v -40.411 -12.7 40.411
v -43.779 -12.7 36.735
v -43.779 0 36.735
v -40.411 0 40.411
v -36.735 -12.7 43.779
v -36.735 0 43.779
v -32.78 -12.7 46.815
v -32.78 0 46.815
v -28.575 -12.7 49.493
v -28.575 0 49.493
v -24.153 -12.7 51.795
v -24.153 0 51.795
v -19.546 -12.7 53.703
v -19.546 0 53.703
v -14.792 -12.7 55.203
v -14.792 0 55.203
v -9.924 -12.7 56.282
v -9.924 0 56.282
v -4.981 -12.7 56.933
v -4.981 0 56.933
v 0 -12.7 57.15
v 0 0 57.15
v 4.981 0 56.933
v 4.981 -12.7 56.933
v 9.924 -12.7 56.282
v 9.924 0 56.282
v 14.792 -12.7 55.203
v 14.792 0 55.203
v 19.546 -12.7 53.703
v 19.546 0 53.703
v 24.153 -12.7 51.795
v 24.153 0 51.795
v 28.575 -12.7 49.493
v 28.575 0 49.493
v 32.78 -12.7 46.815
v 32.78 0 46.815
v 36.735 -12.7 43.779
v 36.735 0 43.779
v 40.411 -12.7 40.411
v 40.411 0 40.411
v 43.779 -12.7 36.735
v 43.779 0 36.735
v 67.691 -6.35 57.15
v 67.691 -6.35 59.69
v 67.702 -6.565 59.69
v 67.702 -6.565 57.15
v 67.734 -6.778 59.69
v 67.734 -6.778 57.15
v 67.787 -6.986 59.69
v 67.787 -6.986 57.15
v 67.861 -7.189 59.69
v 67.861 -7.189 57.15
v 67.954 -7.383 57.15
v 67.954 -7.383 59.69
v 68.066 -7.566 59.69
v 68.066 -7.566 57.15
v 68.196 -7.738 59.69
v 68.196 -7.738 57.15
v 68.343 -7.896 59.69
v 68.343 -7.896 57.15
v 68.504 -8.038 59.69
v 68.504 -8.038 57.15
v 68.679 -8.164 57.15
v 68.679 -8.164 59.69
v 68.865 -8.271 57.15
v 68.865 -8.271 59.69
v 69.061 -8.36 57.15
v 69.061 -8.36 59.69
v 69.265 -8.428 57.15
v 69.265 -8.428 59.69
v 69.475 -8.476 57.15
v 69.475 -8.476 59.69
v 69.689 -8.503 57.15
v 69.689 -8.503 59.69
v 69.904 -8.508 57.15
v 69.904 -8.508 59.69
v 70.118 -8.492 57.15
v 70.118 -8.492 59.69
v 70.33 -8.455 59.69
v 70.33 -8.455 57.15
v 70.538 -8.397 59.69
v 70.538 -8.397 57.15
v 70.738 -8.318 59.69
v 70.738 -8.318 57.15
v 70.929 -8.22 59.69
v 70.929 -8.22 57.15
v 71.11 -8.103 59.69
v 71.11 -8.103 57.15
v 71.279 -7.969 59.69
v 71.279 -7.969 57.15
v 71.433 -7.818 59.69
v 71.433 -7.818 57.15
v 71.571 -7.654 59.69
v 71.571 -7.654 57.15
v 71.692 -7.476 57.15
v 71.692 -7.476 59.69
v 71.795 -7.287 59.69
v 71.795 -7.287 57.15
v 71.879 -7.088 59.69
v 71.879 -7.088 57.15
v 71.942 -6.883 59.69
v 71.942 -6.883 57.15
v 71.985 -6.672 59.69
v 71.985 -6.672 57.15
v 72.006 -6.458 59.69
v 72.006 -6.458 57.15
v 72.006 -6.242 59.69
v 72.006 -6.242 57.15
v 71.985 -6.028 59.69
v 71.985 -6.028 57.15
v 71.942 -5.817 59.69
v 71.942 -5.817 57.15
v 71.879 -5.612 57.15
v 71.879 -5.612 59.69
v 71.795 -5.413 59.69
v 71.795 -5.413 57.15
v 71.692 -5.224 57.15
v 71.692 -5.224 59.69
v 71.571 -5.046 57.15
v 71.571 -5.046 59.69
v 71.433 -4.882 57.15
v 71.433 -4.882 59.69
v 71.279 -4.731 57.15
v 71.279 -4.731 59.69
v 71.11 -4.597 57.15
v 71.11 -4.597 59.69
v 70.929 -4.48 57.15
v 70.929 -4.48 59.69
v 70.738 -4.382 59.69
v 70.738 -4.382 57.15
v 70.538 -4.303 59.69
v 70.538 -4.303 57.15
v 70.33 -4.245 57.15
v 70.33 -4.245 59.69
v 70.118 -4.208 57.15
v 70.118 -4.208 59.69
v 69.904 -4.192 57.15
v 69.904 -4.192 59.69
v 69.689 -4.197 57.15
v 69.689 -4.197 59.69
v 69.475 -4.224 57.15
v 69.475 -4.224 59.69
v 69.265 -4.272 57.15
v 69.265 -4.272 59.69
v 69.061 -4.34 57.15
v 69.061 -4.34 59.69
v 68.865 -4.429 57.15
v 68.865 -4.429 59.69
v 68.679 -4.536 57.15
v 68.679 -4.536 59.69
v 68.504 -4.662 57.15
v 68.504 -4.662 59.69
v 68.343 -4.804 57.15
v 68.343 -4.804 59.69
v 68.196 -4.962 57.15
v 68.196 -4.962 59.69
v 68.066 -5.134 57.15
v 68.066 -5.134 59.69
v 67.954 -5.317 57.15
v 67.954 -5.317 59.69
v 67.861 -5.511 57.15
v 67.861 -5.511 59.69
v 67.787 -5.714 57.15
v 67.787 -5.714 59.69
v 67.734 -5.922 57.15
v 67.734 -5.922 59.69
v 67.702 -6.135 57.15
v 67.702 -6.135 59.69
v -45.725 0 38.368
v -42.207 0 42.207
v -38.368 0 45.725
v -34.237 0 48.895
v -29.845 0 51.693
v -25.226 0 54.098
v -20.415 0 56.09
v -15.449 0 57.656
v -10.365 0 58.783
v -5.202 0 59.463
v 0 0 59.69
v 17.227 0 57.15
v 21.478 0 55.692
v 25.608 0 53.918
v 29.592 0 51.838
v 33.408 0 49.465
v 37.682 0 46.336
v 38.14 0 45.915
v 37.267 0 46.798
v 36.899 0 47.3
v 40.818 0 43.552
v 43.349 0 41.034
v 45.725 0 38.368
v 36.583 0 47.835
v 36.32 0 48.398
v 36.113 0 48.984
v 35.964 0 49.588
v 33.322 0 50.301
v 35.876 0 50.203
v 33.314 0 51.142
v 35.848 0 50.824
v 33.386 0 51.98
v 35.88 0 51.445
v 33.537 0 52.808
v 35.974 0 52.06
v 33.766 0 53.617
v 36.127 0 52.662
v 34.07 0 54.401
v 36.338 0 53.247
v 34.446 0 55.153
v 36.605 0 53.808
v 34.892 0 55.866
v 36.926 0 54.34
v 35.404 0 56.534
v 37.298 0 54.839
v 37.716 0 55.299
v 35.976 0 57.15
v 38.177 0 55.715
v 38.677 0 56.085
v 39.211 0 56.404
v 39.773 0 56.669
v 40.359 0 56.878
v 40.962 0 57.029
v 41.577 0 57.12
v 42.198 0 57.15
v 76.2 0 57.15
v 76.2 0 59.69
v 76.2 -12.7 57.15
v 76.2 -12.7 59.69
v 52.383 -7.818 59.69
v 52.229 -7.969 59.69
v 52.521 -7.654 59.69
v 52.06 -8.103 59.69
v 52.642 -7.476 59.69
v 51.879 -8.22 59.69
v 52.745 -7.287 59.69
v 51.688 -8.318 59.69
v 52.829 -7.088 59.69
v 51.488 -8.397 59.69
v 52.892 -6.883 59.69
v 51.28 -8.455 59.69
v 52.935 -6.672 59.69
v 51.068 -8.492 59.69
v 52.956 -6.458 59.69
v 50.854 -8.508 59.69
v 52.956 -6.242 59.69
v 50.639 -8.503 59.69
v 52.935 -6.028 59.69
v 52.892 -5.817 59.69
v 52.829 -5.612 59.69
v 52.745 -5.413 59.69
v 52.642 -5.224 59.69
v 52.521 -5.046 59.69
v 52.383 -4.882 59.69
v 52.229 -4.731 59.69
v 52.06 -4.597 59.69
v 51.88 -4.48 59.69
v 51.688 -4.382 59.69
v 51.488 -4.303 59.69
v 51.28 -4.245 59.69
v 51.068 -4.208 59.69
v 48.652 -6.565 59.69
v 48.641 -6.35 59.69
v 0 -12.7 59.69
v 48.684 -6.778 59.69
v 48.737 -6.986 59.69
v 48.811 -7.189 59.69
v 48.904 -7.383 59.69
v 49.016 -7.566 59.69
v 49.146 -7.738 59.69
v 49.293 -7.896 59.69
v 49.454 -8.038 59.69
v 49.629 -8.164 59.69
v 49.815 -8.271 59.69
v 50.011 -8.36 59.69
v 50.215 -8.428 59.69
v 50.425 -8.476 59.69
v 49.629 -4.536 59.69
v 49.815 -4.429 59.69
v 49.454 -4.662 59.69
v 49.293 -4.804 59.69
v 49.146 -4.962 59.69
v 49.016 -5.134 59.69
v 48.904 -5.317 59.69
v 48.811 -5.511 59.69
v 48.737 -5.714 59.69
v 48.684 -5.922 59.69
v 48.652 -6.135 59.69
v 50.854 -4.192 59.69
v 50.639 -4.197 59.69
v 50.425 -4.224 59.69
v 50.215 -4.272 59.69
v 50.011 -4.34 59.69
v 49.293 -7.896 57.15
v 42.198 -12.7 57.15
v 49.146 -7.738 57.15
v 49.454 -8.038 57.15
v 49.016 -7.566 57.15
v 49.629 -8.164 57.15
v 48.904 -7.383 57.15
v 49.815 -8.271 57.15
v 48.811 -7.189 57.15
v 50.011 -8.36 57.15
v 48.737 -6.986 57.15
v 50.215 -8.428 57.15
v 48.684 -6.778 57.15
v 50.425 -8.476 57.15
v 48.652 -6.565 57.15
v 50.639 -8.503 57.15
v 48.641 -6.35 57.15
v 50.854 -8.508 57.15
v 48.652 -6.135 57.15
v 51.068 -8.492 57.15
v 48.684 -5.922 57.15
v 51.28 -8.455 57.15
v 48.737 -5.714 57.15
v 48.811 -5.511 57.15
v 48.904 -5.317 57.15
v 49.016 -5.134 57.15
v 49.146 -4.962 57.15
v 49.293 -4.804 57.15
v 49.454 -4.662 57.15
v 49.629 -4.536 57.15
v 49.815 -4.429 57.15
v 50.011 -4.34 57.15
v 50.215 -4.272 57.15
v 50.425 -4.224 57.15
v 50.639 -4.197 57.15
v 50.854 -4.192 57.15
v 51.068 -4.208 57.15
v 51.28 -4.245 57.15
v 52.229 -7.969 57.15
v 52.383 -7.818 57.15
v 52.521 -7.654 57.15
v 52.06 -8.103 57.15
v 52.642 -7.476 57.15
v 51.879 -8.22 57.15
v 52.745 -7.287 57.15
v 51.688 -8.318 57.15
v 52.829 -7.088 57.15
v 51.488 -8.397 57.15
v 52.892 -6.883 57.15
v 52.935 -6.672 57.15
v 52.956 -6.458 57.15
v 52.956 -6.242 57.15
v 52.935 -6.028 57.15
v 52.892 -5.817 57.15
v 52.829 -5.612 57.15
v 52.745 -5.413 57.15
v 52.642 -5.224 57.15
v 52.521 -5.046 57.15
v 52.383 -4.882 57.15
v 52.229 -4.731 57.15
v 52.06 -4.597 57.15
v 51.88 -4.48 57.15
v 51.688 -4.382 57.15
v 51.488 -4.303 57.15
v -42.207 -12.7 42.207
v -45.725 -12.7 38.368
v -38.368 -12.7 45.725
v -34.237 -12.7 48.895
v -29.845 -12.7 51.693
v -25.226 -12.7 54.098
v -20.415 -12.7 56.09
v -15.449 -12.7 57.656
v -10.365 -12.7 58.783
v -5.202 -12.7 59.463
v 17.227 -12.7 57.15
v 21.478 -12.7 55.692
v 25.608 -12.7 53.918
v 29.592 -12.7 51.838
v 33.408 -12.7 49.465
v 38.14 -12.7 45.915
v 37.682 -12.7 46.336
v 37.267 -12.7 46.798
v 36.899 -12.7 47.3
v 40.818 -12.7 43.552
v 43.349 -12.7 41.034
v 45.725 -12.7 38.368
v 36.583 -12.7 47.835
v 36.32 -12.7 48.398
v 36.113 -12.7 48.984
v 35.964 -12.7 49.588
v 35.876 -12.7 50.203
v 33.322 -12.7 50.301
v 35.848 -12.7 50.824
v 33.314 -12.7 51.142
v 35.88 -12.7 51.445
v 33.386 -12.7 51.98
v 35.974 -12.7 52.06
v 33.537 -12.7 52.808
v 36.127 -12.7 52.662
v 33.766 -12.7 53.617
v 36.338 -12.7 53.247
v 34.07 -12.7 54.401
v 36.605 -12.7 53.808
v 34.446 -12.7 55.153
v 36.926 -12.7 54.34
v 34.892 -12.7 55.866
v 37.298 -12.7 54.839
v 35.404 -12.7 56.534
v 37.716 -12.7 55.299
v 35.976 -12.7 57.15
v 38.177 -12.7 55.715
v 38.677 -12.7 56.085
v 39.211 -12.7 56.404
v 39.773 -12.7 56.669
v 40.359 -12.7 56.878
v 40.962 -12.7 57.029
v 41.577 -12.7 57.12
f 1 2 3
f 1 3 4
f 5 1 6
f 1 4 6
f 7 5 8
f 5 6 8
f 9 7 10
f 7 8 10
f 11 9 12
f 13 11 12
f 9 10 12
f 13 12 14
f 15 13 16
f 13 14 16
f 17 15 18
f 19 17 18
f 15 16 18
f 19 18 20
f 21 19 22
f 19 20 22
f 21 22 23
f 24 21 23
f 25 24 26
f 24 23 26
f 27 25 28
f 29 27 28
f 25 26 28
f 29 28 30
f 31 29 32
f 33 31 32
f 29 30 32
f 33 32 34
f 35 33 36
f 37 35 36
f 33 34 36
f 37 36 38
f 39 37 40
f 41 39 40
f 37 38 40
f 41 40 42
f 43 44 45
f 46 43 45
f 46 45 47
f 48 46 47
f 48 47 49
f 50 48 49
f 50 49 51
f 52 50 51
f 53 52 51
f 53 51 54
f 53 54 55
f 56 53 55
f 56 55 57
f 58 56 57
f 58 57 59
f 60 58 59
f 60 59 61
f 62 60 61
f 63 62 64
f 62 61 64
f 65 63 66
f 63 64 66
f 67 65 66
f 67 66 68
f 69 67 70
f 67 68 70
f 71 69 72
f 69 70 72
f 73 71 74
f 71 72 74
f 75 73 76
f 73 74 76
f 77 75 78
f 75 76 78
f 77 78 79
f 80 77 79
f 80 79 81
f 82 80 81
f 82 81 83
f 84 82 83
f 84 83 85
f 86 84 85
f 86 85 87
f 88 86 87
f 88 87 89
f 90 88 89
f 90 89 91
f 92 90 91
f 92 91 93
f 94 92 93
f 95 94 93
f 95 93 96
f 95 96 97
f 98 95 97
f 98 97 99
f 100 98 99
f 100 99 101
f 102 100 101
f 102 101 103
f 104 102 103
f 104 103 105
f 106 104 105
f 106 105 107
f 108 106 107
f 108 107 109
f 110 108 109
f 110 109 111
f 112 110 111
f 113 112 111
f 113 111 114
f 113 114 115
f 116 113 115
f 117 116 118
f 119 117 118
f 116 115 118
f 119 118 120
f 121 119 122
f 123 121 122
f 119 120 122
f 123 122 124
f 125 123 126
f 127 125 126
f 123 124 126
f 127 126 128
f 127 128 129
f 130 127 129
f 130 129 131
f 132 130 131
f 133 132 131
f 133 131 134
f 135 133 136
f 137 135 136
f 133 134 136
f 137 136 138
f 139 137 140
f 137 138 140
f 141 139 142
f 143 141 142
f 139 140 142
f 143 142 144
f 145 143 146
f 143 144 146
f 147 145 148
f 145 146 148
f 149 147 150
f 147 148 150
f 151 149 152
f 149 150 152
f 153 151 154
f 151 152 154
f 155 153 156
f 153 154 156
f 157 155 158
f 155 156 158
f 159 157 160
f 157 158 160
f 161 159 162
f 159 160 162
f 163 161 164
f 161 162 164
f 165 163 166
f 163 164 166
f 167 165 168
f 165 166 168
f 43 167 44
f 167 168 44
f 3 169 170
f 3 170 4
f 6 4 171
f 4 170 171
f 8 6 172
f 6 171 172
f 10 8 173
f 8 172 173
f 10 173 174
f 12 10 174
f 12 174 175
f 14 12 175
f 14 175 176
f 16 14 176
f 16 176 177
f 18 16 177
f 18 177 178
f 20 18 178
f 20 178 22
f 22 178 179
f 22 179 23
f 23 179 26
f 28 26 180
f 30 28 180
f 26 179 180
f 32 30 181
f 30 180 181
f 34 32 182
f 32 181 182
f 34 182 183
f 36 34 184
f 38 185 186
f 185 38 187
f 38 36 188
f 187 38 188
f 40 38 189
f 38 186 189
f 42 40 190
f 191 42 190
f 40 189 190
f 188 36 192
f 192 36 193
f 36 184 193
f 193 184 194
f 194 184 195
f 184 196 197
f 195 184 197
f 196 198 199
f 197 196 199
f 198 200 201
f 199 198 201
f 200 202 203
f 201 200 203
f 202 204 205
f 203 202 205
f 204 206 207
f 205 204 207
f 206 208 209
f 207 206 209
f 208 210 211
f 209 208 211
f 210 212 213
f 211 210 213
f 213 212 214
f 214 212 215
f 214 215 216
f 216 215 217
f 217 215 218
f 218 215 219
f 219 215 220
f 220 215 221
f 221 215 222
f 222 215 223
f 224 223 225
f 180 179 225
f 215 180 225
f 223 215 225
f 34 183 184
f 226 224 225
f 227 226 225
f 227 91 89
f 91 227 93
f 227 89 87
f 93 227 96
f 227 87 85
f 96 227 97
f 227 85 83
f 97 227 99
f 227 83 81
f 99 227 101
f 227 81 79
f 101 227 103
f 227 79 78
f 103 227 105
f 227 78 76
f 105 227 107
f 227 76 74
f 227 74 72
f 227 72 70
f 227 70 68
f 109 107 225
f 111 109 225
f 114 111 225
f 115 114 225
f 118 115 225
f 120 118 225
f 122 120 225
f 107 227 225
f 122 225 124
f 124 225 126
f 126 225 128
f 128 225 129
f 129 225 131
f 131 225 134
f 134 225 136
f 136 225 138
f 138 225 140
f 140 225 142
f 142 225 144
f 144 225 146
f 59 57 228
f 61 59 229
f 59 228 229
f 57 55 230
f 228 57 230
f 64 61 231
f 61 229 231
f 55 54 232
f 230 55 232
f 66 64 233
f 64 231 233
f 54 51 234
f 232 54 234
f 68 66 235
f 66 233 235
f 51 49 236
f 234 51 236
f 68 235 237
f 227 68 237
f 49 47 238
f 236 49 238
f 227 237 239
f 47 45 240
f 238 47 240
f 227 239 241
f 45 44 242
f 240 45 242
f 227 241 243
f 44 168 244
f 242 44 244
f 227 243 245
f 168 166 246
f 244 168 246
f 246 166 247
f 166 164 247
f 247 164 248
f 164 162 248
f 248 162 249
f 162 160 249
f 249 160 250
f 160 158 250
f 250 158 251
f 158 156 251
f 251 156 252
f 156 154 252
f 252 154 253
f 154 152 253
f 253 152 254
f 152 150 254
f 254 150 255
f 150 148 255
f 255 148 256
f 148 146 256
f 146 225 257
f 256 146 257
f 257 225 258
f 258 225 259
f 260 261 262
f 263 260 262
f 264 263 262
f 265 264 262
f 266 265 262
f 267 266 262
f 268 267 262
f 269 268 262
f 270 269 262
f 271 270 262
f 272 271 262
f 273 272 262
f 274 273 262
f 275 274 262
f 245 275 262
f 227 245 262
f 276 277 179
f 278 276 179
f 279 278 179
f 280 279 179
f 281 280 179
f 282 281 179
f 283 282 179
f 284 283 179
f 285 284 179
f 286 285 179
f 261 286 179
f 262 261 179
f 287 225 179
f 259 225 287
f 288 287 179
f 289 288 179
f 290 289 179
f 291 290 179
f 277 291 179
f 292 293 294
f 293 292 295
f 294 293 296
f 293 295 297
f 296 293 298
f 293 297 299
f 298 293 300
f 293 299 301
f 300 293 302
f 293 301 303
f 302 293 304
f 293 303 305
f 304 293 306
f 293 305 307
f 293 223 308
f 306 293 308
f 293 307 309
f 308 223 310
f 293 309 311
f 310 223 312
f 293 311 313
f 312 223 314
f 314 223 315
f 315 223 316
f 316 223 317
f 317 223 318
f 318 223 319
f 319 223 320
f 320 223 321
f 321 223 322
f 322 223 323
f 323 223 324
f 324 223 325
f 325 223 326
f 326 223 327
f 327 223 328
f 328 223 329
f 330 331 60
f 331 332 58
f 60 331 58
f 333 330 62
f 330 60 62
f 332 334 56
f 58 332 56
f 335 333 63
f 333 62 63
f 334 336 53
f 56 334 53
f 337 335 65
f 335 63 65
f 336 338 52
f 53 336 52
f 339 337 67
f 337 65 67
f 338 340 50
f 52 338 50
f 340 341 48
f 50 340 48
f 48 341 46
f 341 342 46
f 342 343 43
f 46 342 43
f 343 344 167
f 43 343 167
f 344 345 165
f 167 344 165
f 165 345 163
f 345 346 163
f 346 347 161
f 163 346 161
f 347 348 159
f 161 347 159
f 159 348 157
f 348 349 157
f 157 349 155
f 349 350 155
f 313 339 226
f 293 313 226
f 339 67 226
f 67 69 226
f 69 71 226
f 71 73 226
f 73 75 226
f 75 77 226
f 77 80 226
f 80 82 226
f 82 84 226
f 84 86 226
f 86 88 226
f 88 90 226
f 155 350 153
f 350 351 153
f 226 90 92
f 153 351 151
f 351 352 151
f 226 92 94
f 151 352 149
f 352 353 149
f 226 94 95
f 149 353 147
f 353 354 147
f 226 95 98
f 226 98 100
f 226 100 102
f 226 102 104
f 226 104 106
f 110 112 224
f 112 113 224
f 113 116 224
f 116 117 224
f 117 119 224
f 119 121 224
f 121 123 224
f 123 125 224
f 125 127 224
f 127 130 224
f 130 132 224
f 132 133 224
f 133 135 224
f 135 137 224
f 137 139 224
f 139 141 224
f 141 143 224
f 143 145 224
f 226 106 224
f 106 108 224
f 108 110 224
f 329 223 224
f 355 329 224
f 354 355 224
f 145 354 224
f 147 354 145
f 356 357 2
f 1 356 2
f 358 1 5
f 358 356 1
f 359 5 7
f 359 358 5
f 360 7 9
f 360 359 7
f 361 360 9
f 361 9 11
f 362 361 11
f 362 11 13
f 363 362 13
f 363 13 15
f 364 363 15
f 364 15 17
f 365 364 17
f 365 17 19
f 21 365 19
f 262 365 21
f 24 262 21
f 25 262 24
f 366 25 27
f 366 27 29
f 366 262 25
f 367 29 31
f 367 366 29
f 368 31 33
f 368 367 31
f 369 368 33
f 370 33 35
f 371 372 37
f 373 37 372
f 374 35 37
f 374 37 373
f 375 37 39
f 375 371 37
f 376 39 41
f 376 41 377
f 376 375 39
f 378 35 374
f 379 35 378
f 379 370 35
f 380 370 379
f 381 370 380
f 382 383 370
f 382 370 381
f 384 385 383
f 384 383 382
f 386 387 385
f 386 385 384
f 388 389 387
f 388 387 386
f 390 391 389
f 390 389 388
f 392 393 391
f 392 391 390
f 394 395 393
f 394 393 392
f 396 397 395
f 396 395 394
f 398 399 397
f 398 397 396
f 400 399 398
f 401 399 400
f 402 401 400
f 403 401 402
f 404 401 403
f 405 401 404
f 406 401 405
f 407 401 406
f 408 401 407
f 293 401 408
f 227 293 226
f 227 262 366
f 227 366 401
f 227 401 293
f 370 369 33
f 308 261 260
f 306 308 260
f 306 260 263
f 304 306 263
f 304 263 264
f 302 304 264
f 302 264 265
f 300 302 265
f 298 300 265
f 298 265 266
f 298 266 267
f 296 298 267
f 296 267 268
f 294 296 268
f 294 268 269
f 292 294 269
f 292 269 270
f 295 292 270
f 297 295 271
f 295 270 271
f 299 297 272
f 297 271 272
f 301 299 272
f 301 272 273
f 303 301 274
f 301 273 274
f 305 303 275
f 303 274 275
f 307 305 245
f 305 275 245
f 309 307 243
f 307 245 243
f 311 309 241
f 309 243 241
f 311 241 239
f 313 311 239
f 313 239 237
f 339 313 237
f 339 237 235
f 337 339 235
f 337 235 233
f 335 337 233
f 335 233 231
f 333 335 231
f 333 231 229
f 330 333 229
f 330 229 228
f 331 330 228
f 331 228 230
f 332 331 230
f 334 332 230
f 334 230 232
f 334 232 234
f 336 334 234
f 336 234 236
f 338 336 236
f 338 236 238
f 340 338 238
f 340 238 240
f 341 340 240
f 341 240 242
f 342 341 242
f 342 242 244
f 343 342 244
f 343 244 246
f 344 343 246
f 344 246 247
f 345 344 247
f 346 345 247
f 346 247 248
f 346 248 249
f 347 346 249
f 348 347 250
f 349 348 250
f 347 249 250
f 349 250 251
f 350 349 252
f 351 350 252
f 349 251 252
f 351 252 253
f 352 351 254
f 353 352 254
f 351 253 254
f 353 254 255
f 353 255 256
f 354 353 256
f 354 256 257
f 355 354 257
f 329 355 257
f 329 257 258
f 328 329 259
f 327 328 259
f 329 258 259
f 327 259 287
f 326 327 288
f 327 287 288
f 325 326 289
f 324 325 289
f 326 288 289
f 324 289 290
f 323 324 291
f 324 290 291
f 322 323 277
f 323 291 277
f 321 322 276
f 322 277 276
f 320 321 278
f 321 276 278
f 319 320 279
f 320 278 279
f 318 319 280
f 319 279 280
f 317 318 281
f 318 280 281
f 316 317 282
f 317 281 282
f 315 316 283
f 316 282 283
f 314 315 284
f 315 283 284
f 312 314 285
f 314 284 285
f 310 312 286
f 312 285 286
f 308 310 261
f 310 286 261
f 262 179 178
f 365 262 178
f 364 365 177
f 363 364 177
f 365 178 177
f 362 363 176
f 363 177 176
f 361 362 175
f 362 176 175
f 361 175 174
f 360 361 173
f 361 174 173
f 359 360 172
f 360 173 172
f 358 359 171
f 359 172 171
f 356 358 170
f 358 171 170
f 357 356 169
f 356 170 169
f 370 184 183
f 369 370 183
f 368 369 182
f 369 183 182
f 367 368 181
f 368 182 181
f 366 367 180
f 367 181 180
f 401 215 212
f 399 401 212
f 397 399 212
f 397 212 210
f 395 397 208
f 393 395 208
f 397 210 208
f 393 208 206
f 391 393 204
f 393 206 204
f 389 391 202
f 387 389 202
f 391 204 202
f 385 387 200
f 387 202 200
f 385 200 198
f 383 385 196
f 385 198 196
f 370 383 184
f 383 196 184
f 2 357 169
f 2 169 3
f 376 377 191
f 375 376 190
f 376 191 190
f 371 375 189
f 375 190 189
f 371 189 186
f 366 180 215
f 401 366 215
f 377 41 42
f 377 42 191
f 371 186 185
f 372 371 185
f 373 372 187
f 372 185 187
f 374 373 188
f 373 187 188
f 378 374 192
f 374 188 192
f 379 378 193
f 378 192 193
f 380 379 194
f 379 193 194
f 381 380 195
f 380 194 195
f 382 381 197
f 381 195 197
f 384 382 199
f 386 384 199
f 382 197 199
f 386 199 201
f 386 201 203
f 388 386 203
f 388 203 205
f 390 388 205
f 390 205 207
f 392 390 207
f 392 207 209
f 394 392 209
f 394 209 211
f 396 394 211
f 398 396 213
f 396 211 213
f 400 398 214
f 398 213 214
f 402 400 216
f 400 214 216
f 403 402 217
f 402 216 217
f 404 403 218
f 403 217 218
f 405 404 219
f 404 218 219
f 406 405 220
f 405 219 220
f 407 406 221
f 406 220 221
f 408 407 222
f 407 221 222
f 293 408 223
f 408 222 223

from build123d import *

# Parameters (mm, degrees)
F1_DEPTH = 12.7
F3_D     = 4.318
F3_DEPTH = 25.4
F3_TIP   = 1.2972580765


with BuildPart() as f1:
    # F0 (on Front) → F1 (new body)
    with BuildSketch(Plane.XZ):
        with BuildLine():
            ThreePointArc((0, 57.15), (24.1526336585, 51.7954900291), (43.7794399242, 36.7353118936))
            Line((43.7794399242, 36.7353118936), (45.7251928098, 38.3679924222))
            ThreePointArc((45.7251928098, 38.3679924222), (42.1021507188, 42.3119959923), (38.1401829521, 45.9153846154))
            ThreePointArc((38.1401829521, 45.9153846154), (36.2252205848, 52.95698775), (42.1976492236, 57.15))
            Line((42.1976492236, 57.15), (76.2, 57.15))
            Line((76.2, 57.15), (76.2, 59.69))
            Line((76.2, 59.69), (0, 59.69))
            ThreePointArc((0, 59.69), (-25.2260840433, 54.0975118082), (-45.7251928098, 38.3679924222))
            Line((-45.7251928098, 38.3679924222), (-43.7794399242, 36.7353118936))
            ThreePointArc((-43.7794399242, 36.7353118936), (-24.1526336585, 51.7954900291), (0, 57.15))
        make_face()
        with BuildLine():
            Line((17.2271181571, 57.15), (35.975945277, 57.15))
            ThreePointArc((35.975945277, 57.15), (33.7657449416, 53.6169292109), (33.4084844583, 49.4648285775))
            ThreePointArc((33.4084844583, 49.4648285775), (25.6077435165, 53.9178965836), (17.2271181571, 57.15))
        make_face(mode=Mode.SUBTRACT)
    extrude(amount=F1_DEPTH)

    # F3
    with Locations(Plane(origin=(0, 0, 57.15), x_dir=(1, 0, 0), z_dir=(0, 0, -1))):
        with Locations((69.85, 6.35), (50.8, 6.35)):
            Hole(F3_D / 2, depth=F3_DEPTH)
            with Locations((0, 0, -(F3_DEPTH + F3_TIP / 2))):  # 118° drill point
                Cone(0, F3_D / 2, F3_TIP, mode=Mode.SUBTRACT)


solid = f1.part
